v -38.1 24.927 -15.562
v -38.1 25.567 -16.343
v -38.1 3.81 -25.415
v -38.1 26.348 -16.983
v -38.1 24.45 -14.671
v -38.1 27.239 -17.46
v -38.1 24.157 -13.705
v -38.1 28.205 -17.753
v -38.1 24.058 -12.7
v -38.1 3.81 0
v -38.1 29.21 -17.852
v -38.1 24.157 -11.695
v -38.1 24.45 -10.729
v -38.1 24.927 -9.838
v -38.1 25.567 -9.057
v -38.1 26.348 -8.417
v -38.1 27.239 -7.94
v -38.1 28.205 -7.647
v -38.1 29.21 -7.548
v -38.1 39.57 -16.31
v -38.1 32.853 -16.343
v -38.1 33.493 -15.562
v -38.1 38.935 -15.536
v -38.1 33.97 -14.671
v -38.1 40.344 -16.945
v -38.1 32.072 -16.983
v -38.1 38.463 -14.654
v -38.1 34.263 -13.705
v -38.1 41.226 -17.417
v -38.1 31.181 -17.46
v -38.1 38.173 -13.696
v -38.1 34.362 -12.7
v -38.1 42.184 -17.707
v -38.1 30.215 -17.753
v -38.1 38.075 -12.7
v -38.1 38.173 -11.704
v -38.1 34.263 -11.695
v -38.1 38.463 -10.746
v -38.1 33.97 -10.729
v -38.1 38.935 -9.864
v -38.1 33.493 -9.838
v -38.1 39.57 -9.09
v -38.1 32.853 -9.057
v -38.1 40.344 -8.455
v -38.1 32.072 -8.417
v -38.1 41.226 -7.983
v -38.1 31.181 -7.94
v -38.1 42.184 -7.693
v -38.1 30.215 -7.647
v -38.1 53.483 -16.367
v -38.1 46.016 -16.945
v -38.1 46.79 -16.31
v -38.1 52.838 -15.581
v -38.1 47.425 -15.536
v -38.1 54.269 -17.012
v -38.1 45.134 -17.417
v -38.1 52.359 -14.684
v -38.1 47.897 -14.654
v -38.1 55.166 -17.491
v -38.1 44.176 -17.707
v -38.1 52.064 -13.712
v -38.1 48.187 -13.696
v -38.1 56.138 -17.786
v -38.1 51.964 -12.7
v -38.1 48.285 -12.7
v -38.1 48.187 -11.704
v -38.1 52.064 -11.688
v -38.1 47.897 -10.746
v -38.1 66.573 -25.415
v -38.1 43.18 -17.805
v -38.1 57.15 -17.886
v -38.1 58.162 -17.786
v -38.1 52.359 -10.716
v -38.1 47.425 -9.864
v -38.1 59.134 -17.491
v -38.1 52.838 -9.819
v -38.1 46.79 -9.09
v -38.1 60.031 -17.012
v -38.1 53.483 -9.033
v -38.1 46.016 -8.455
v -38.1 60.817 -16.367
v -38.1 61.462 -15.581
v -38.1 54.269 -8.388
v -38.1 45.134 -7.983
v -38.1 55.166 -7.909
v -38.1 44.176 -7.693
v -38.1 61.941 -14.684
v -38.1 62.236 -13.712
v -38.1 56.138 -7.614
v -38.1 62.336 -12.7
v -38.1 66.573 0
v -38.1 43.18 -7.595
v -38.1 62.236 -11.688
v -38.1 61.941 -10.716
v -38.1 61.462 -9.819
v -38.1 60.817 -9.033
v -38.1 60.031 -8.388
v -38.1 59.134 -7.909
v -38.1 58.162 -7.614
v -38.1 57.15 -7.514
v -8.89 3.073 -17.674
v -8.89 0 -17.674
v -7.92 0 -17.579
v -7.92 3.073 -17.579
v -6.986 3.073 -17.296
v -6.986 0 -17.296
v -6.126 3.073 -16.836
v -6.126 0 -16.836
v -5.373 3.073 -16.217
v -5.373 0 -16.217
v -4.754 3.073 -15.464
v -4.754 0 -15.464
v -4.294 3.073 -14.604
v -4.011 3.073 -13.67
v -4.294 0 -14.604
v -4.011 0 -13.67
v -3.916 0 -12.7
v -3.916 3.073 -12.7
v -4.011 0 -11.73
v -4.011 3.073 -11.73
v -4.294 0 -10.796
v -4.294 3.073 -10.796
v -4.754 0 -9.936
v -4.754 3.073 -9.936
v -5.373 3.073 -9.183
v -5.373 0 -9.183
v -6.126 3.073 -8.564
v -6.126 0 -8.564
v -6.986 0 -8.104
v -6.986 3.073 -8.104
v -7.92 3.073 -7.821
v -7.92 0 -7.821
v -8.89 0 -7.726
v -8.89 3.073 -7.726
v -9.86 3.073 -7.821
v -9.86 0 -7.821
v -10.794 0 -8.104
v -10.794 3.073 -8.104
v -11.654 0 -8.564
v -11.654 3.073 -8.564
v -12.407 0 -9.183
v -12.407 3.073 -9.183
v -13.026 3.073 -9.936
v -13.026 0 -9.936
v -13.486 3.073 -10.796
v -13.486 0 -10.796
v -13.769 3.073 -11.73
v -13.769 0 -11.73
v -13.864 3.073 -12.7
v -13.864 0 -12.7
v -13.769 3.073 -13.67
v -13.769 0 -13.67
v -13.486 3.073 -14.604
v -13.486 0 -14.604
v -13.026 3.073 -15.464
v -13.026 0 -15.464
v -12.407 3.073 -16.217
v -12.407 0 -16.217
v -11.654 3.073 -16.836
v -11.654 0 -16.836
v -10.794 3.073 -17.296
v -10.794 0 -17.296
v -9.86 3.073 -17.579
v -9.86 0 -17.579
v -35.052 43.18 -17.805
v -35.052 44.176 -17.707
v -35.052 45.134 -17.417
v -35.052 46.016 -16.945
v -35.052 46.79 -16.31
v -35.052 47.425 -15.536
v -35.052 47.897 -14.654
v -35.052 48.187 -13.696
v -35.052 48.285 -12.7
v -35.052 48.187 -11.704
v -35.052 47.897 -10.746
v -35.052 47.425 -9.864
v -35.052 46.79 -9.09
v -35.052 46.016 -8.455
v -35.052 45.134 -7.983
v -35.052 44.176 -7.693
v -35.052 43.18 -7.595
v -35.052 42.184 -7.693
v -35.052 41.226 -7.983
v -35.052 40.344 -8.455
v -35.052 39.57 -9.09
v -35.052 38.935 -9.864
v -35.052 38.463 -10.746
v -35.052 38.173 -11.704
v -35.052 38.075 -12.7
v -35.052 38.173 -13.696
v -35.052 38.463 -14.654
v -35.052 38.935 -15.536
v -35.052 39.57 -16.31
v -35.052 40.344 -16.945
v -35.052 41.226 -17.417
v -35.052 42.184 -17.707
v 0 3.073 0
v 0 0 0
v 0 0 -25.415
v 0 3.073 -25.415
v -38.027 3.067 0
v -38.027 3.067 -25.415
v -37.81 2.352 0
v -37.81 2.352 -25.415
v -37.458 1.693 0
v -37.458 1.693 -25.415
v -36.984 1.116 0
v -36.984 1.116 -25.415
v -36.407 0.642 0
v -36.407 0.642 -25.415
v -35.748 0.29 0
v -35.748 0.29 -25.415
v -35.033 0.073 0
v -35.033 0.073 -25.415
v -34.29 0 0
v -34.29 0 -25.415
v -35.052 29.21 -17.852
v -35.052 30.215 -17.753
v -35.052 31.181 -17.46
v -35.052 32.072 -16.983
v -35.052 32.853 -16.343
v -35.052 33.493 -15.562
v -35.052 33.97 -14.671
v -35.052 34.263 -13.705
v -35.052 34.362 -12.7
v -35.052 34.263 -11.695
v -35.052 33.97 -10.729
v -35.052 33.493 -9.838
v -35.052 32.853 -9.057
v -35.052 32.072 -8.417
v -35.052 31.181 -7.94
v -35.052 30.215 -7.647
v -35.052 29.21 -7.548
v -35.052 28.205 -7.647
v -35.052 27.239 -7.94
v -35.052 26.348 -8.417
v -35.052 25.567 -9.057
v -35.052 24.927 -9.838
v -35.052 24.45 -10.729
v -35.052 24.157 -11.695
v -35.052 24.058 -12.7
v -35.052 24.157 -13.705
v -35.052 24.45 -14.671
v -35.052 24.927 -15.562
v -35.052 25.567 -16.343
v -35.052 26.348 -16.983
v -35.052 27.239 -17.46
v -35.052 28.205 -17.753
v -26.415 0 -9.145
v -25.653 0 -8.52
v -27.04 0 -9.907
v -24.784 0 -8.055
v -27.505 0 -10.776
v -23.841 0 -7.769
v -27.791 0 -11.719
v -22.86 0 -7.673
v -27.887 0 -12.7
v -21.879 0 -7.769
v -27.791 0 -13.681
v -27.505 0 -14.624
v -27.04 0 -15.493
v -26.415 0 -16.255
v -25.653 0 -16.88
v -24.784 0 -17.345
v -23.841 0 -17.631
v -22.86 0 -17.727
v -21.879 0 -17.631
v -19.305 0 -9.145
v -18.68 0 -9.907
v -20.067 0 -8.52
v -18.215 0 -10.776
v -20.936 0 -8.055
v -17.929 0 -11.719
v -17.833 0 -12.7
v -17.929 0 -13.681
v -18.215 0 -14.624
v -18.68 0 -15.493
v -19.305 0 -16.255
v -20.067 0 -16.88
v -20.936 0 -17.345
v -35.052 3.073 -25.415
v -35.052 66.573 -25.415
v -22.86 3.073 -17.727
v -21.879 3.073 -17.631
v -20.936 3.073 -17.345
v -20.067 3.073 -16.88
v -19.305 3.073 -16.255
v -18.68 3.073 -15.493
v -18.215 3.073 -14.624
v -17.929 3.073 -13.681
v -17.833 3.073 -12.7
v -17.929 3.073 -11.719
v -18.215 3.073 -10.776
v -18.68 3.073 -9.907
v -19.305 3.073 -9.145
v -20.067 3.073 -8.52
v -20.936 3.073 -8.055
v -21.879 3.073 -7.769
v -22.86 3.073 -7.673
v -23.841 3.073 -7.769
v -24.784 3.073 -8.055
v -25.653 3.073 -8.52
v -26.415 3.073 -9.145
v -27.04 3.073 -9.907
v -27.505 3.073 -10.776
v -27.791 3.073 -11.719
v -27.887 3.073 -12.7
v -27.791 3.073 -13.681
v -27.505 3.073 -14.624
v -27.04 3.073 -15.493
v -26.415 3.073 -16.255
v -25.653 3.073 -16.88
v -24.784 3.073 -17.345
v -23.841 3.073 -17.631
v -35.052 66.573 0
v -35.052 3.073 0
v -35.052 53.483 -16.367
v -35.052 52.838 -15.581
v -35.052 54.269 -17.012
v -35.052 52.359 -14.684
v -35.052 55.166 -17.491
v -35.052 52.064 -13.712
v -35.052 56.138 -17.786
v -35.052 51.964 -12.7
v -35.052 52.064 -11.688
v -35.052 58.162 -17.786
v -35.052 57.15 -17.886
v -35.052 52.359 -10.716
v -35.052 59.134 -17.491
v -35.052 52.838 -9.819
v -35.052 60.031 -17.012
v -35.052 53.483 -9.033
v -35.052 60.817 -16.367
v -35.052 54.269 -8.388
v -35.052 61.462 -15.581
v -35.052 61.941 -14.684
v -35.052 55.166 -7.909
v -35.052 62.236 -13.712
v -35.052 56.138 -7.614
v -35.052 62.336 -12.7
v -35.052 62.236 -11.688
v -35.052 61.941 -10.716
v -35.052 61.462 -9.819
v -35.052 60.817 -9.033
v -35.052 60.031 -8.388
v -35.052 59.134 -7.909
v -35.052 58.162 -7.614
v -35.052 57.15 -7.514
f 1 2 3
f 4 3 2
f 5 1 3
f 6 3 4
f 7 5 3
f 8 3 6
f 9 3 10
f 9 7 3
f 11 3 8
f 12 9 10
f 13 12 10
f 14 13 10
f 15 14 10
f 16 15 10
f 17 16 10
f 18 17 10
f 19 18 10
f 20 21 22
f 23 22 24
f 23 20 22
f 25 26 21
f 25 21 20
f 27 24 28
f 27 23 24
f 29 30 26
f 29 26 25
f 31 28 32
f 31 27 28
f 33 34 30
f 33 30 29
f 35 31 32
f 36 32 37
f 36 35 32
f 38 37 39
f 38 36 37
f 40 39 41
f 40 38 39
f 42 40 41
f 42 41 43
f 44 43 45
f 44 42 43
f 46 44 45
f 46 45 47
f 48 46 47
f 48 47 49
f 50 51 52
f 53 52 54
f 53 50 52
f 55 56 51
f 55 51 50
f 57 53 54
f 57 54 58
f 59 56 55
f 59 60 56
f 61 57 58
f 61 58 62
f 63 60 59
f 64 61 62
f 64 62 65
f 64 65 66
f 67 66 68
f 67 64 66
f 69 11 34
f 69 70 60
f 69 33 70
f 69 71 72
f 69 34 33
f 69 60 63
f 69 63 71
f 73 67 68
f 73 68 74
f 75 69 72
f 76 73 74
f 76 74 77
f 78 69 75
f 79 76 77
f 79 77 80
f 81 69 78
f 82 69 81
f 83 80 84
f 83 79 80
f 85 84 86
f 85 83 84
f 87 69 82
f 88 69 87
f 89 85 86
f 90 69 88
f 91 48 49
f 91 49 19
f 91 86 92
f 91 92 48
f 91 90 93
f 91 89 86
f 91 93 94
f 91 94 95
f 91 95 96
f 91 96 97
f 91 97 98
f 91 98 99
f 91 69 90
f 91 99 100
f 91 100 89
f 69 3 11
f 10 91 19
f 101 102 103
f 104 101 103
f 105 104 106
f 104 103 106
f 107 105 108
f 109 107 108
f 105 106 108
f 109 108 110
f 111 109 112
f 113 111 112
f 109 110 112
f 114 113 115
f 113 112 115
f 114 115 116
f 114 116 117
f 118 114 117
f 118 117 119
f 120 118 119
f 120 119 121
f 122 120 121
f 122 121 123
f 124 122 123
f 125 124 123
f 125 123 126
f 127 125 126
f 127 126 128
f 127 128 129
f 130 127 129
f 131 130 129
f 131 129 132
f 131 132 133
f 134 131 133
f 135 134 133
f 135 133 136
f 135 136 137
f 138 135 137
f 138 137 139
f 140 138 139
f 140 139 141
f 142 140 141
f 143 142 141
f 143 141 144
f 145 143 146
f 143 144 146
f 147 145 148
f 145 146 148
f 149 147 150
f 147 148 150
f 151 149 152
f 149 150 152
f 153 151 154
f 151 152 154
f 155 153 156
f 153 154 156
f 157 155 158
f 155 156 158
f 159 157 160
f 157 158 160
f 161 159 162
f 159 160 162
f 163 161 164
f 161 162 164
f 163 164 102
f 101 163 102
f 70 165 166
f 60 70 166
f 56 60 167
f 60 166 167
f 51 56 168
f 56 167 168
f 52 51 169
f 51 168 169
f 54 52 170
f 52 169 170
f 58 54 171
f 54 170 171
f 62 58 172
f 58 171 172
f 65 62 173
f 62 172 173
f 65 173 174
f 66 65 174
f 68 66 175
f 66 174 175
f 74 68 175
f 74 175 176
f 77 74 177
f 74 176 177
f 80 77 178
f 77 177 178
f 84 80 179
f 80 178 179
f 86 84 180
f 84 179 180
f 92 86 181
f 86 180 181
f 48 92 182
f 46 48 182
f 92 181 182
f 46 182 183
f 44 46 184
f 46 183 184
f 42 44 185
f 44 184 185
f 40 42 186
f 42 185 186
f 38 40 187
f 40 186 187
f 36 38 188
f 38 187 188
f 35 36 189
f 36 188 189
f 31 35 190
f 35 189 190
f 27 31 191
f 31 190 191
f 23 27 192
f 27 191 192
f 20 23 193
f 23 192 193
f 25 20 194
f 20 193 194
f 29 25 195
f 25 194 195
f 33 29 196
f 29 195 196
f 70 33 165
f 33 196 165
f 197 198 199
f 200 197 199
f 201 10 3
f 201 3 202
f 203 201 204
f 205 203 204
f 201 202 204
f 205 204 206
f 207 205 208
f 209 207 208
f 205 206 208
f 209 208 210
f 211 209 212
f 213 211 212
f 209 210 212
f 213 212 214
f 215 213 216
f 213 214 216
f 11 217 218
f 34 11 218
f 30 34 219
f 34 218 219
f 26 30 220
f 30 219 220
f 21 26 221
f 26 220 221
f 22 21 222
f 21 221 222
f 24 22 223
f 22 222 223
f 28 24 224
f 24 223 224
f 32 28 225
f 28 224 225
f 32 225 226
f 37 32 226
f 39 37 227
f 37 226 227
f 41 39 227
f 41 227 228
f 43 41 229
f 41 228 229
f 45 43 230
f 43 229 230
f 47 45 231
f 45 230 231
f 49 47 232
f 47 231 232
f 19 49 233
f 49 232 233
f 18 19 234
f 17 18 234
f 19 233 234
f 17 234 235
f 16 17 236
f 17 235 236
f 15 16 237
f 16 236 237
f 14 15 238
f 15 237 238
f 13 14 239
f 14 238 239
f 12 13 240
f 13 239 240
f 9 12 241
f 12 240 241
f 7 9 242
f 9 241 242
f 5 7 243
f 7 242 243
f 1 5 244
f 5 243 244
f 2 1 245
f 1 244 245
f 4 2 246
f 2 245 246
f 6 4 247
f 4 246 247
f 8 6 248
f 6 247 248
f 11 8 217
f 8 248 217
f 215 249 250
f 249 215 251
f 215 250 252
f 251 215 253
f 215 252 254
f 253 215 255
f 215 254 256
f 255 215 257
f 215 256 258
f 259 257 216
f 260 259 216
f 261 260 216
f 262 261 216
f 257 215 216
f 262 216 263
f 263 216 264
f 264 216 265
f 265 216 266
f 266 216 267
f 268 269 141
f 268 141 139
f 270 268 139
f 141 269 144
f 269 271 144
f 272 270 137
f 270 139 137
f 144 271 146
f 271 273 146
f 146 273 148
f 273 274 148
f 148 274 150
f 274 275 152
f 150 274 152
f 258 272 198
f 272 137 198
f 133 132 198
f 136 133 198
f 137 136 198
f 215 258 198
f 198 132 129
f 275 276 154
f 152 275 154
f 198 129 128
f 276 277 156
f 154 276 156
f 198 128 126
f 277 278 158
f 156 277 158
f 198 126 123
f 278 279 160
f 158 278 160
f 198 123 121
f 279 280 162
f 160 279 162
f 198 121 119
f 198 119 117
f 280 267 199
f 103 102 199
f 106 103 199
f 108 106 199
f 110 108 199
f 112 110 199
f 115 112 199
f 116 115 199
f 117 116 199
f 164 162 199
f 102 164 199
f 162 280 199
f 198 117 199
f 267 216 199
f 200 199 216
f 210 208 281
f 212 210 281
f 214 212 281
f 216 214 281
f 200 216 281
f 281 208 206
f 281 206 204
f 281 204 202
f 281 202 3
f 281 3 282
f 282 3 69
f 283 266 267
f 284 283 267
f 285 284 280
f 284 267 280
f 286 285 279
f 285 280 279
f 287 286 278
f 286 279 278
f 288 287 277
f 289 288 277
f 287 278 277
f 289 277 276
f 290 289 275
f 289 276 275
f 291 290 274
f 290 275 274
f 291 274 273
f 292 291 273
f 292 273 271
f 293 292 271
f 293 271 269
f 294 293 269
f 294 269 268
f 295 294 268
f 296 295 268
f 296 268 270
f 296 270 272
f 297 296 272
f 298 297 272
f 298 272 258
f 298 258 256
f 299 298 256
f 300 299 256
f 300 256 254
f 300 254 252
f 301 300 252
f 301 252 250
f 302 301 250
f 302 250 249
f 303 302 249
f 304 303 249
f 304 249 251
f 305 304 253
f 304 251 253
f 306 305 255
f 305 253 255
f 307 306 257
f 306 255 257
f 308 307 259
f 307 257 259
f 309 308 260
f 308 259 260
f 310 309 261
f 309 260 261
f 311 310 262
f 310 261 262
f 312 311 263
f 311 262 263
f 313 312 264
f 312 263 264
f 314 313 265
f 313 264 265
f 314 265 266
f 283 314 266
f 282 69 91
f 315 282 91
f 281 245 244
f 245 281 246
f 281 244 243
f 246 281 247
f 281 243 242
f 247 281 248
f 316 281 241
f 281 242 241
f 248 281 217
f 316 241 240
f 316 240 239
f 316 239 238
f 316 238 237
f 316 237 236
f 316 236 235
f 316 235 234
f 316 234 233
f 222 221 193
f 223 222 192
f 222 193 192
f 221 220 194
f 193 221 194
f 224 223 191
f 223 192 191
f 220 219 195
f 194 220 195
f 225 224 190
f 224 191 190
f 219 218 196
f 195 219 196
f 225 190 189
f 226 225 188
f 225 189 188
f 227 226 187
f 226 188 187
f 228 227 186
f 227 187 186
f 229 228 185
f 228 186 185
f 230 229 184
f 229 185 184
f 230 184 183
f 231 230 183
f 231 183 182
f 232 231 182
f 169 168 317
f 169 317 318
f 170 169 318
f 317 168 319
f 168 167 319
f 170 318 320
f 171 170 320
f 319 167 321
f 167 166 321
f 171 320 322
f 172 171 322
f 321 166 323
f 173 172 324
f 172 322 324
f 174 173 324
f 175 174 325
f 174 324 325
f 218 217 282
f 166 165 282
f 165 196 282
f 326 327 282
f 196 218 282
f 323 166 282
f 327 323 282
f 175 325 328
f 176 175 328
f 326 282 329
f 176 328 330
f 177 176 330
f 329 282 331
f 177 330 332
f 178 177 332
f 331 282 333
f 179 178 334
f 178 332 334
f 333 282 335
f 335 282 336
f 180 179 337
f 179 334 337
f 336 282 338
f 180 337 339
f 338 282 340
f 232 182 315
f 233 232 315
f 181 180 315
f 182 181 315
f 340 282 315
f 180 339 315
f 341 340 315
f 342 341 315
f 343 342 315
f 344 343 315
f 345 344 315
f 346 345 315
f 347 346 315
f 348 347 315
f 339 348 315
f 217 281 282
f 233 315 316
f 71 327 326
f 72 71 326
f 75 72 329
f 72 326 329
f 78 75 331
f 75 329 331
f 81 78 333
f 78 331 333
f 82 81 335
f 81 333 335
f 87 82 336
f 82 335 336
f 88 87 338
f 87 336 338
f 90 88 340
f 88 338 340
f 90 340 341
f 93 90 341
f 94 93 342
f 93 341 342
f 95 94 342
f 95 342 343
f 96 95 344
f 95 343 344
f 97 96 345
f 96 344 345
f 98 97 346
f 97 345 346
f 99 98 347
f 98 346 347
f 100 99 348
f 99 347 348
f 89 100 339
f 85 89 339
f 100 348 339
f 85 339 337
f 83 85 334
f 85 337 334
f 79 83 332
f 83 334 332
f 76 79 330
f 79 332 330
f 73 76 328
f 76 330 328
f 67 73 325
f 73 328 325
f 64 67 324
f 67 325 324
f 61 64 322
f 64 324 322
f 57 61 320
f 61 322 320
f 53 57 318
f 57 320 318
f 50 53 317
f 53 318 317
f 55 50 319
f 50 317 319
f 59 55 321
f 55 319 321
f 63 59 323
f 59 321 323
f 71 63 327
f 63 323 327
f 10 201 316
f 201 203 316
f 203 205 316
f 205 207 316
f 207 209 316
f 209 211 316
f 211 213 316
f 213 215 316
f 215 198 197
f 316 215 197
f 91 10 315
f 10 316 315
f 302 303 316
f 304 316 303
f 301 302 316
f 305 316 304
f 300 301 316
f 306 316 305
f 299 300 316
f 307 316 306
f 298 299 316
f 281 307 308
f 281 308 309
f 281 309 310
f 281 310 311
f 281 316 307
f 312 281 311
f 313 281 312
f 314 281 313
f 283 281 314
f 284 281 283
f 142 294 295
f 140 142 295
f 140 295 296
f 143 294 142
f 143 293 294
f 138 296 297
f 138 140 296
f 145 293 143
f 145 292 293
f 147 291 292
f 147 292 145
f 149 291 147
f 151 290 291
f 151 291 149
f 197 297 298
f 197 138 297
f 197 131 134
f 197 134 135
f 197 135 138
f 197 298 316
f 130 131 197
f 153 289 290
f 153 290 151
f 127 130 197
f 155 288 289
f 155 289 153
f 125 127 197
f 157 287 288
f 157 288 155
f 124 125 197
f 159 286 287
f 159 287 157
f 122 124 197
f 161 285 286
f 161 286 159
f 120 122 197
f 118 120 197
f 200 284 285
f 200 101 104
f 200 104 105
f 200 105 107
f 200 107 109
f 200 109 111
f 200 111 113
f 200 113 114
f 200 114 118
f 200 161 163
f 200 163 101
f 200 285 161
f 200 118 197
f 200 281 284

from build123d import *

# Parameters (mm, degrees)
SKETCH1_W           = 38.1
SKETCH1_H           = 25.415165138
BOSS_EXTRUDE1_DEPTH = 3.0734
SKETCH2_W           = 28.174522189
SKETCH2_H           = 63.5
BOSS_EXTRUDE2_DEPTH = 3.048
SKETCH3_W           = 2.759357051
SKETCH3_H           = 63.5
CUT_EXTRUDE1_DEPTH  = 3.048
FILLET1_R           = 3.81
SKETCH4_R           = 5.185736545
SKETCH4_R_2         = 5.105364429
SKETCH4_R_3         = 5.151648863
CUT_EXTRUDE2_DEPTH  = 3.048
SKETCH5_R           = 5.027262634
SKETCH5_R_2         = 4.974374785
CUT_EXTRUDE3_DEPTH  = 3.556


with BuildPart() as part:
    # Sketch1 → Boss-Extrude1 (new body)
    with BuildSketch(Plane(origin=(0, 0, 0), x_dir=(1, 0, 0), z_dir=(0, 1, 0))):
        with Locations((-19.05, 12.707582569)):
            Rectangle(SKETCH1_W, SKETCH1_H)
    extrude(amount=BOSS_EXTRUDE1_DEPTH)

    # Sketch2 → Boss-Extrude2 (add)
    with BuildSketch(Plane.ZY.offset(38.1)):
        with Locations((-11.327904044, 34.8234)):
            Rectangle(SKETCH2_W, SKETCH2_H)
    extrude(amount=-BOSS_EXTRUDE2_DEPTH)

    # Sketch3 → Cut-Extrude1 (cut)
    with BuildSketch(Plane(origin=(-35.052, 0, 0), x_dir=(0, 0, -1), z_dir=(1, 0, 0))):
        with Locations((-1.379678526, 34.8234)):
            Rectangle(SKETCH3_W, SKETCH3_H)
    extrude(amount=-CUT_EXTRUDE1_DEPTH, mode=Mode.SUBTRACT)

    # Fillet1
    fillet1_edges = [part.edges().sort_by_distance(p)[0] for p in [
        (-38.1, 0, -12.707582569),
    ]]
    fillet(fillet1_edges, radius=FILLET1_R)

    # Sketch4 → Cut-Extrude2 (cut)
    with BuildSketch(Plane(origin=(-35.052, 0, 0), x_dir=(0, 0, -1), z_dir=(1, 0, 0))):
        with Locations((12.7, 57.15)):
            Circle(SKETCH4_R)
        with Locations((12.7, 43.18)):
            Circle(SKETCH4_R_2)
        with Locations((12.7, 29.21)):
            Circle(SKETCH4_R_3)
    extrude(amount=-CUT_EXTRUDE2_DEPTH, mode=Mode.SUBTRACT)

    # Sketch5 → Cut-Extrude3 (cut)
    with BuildSketch(Plane(origin=(0, 0, 0), x_dir=(-1, 0, 0), z_dir=(0, -1, 0))):
        with Locations(Location((22.86, 12.7, 0), (0, 0, 90))):
            Circle(SKETCH5_R)
        with Locations(Location((8.89, 12.7, 0), (0, 0, 90))):
            Circle(SKETCH5_R_2)
    extrude(amount=-CUT_EXTRUDE3_DEPTH, mode=Mode.SUBTRACT)


solid = part.part
